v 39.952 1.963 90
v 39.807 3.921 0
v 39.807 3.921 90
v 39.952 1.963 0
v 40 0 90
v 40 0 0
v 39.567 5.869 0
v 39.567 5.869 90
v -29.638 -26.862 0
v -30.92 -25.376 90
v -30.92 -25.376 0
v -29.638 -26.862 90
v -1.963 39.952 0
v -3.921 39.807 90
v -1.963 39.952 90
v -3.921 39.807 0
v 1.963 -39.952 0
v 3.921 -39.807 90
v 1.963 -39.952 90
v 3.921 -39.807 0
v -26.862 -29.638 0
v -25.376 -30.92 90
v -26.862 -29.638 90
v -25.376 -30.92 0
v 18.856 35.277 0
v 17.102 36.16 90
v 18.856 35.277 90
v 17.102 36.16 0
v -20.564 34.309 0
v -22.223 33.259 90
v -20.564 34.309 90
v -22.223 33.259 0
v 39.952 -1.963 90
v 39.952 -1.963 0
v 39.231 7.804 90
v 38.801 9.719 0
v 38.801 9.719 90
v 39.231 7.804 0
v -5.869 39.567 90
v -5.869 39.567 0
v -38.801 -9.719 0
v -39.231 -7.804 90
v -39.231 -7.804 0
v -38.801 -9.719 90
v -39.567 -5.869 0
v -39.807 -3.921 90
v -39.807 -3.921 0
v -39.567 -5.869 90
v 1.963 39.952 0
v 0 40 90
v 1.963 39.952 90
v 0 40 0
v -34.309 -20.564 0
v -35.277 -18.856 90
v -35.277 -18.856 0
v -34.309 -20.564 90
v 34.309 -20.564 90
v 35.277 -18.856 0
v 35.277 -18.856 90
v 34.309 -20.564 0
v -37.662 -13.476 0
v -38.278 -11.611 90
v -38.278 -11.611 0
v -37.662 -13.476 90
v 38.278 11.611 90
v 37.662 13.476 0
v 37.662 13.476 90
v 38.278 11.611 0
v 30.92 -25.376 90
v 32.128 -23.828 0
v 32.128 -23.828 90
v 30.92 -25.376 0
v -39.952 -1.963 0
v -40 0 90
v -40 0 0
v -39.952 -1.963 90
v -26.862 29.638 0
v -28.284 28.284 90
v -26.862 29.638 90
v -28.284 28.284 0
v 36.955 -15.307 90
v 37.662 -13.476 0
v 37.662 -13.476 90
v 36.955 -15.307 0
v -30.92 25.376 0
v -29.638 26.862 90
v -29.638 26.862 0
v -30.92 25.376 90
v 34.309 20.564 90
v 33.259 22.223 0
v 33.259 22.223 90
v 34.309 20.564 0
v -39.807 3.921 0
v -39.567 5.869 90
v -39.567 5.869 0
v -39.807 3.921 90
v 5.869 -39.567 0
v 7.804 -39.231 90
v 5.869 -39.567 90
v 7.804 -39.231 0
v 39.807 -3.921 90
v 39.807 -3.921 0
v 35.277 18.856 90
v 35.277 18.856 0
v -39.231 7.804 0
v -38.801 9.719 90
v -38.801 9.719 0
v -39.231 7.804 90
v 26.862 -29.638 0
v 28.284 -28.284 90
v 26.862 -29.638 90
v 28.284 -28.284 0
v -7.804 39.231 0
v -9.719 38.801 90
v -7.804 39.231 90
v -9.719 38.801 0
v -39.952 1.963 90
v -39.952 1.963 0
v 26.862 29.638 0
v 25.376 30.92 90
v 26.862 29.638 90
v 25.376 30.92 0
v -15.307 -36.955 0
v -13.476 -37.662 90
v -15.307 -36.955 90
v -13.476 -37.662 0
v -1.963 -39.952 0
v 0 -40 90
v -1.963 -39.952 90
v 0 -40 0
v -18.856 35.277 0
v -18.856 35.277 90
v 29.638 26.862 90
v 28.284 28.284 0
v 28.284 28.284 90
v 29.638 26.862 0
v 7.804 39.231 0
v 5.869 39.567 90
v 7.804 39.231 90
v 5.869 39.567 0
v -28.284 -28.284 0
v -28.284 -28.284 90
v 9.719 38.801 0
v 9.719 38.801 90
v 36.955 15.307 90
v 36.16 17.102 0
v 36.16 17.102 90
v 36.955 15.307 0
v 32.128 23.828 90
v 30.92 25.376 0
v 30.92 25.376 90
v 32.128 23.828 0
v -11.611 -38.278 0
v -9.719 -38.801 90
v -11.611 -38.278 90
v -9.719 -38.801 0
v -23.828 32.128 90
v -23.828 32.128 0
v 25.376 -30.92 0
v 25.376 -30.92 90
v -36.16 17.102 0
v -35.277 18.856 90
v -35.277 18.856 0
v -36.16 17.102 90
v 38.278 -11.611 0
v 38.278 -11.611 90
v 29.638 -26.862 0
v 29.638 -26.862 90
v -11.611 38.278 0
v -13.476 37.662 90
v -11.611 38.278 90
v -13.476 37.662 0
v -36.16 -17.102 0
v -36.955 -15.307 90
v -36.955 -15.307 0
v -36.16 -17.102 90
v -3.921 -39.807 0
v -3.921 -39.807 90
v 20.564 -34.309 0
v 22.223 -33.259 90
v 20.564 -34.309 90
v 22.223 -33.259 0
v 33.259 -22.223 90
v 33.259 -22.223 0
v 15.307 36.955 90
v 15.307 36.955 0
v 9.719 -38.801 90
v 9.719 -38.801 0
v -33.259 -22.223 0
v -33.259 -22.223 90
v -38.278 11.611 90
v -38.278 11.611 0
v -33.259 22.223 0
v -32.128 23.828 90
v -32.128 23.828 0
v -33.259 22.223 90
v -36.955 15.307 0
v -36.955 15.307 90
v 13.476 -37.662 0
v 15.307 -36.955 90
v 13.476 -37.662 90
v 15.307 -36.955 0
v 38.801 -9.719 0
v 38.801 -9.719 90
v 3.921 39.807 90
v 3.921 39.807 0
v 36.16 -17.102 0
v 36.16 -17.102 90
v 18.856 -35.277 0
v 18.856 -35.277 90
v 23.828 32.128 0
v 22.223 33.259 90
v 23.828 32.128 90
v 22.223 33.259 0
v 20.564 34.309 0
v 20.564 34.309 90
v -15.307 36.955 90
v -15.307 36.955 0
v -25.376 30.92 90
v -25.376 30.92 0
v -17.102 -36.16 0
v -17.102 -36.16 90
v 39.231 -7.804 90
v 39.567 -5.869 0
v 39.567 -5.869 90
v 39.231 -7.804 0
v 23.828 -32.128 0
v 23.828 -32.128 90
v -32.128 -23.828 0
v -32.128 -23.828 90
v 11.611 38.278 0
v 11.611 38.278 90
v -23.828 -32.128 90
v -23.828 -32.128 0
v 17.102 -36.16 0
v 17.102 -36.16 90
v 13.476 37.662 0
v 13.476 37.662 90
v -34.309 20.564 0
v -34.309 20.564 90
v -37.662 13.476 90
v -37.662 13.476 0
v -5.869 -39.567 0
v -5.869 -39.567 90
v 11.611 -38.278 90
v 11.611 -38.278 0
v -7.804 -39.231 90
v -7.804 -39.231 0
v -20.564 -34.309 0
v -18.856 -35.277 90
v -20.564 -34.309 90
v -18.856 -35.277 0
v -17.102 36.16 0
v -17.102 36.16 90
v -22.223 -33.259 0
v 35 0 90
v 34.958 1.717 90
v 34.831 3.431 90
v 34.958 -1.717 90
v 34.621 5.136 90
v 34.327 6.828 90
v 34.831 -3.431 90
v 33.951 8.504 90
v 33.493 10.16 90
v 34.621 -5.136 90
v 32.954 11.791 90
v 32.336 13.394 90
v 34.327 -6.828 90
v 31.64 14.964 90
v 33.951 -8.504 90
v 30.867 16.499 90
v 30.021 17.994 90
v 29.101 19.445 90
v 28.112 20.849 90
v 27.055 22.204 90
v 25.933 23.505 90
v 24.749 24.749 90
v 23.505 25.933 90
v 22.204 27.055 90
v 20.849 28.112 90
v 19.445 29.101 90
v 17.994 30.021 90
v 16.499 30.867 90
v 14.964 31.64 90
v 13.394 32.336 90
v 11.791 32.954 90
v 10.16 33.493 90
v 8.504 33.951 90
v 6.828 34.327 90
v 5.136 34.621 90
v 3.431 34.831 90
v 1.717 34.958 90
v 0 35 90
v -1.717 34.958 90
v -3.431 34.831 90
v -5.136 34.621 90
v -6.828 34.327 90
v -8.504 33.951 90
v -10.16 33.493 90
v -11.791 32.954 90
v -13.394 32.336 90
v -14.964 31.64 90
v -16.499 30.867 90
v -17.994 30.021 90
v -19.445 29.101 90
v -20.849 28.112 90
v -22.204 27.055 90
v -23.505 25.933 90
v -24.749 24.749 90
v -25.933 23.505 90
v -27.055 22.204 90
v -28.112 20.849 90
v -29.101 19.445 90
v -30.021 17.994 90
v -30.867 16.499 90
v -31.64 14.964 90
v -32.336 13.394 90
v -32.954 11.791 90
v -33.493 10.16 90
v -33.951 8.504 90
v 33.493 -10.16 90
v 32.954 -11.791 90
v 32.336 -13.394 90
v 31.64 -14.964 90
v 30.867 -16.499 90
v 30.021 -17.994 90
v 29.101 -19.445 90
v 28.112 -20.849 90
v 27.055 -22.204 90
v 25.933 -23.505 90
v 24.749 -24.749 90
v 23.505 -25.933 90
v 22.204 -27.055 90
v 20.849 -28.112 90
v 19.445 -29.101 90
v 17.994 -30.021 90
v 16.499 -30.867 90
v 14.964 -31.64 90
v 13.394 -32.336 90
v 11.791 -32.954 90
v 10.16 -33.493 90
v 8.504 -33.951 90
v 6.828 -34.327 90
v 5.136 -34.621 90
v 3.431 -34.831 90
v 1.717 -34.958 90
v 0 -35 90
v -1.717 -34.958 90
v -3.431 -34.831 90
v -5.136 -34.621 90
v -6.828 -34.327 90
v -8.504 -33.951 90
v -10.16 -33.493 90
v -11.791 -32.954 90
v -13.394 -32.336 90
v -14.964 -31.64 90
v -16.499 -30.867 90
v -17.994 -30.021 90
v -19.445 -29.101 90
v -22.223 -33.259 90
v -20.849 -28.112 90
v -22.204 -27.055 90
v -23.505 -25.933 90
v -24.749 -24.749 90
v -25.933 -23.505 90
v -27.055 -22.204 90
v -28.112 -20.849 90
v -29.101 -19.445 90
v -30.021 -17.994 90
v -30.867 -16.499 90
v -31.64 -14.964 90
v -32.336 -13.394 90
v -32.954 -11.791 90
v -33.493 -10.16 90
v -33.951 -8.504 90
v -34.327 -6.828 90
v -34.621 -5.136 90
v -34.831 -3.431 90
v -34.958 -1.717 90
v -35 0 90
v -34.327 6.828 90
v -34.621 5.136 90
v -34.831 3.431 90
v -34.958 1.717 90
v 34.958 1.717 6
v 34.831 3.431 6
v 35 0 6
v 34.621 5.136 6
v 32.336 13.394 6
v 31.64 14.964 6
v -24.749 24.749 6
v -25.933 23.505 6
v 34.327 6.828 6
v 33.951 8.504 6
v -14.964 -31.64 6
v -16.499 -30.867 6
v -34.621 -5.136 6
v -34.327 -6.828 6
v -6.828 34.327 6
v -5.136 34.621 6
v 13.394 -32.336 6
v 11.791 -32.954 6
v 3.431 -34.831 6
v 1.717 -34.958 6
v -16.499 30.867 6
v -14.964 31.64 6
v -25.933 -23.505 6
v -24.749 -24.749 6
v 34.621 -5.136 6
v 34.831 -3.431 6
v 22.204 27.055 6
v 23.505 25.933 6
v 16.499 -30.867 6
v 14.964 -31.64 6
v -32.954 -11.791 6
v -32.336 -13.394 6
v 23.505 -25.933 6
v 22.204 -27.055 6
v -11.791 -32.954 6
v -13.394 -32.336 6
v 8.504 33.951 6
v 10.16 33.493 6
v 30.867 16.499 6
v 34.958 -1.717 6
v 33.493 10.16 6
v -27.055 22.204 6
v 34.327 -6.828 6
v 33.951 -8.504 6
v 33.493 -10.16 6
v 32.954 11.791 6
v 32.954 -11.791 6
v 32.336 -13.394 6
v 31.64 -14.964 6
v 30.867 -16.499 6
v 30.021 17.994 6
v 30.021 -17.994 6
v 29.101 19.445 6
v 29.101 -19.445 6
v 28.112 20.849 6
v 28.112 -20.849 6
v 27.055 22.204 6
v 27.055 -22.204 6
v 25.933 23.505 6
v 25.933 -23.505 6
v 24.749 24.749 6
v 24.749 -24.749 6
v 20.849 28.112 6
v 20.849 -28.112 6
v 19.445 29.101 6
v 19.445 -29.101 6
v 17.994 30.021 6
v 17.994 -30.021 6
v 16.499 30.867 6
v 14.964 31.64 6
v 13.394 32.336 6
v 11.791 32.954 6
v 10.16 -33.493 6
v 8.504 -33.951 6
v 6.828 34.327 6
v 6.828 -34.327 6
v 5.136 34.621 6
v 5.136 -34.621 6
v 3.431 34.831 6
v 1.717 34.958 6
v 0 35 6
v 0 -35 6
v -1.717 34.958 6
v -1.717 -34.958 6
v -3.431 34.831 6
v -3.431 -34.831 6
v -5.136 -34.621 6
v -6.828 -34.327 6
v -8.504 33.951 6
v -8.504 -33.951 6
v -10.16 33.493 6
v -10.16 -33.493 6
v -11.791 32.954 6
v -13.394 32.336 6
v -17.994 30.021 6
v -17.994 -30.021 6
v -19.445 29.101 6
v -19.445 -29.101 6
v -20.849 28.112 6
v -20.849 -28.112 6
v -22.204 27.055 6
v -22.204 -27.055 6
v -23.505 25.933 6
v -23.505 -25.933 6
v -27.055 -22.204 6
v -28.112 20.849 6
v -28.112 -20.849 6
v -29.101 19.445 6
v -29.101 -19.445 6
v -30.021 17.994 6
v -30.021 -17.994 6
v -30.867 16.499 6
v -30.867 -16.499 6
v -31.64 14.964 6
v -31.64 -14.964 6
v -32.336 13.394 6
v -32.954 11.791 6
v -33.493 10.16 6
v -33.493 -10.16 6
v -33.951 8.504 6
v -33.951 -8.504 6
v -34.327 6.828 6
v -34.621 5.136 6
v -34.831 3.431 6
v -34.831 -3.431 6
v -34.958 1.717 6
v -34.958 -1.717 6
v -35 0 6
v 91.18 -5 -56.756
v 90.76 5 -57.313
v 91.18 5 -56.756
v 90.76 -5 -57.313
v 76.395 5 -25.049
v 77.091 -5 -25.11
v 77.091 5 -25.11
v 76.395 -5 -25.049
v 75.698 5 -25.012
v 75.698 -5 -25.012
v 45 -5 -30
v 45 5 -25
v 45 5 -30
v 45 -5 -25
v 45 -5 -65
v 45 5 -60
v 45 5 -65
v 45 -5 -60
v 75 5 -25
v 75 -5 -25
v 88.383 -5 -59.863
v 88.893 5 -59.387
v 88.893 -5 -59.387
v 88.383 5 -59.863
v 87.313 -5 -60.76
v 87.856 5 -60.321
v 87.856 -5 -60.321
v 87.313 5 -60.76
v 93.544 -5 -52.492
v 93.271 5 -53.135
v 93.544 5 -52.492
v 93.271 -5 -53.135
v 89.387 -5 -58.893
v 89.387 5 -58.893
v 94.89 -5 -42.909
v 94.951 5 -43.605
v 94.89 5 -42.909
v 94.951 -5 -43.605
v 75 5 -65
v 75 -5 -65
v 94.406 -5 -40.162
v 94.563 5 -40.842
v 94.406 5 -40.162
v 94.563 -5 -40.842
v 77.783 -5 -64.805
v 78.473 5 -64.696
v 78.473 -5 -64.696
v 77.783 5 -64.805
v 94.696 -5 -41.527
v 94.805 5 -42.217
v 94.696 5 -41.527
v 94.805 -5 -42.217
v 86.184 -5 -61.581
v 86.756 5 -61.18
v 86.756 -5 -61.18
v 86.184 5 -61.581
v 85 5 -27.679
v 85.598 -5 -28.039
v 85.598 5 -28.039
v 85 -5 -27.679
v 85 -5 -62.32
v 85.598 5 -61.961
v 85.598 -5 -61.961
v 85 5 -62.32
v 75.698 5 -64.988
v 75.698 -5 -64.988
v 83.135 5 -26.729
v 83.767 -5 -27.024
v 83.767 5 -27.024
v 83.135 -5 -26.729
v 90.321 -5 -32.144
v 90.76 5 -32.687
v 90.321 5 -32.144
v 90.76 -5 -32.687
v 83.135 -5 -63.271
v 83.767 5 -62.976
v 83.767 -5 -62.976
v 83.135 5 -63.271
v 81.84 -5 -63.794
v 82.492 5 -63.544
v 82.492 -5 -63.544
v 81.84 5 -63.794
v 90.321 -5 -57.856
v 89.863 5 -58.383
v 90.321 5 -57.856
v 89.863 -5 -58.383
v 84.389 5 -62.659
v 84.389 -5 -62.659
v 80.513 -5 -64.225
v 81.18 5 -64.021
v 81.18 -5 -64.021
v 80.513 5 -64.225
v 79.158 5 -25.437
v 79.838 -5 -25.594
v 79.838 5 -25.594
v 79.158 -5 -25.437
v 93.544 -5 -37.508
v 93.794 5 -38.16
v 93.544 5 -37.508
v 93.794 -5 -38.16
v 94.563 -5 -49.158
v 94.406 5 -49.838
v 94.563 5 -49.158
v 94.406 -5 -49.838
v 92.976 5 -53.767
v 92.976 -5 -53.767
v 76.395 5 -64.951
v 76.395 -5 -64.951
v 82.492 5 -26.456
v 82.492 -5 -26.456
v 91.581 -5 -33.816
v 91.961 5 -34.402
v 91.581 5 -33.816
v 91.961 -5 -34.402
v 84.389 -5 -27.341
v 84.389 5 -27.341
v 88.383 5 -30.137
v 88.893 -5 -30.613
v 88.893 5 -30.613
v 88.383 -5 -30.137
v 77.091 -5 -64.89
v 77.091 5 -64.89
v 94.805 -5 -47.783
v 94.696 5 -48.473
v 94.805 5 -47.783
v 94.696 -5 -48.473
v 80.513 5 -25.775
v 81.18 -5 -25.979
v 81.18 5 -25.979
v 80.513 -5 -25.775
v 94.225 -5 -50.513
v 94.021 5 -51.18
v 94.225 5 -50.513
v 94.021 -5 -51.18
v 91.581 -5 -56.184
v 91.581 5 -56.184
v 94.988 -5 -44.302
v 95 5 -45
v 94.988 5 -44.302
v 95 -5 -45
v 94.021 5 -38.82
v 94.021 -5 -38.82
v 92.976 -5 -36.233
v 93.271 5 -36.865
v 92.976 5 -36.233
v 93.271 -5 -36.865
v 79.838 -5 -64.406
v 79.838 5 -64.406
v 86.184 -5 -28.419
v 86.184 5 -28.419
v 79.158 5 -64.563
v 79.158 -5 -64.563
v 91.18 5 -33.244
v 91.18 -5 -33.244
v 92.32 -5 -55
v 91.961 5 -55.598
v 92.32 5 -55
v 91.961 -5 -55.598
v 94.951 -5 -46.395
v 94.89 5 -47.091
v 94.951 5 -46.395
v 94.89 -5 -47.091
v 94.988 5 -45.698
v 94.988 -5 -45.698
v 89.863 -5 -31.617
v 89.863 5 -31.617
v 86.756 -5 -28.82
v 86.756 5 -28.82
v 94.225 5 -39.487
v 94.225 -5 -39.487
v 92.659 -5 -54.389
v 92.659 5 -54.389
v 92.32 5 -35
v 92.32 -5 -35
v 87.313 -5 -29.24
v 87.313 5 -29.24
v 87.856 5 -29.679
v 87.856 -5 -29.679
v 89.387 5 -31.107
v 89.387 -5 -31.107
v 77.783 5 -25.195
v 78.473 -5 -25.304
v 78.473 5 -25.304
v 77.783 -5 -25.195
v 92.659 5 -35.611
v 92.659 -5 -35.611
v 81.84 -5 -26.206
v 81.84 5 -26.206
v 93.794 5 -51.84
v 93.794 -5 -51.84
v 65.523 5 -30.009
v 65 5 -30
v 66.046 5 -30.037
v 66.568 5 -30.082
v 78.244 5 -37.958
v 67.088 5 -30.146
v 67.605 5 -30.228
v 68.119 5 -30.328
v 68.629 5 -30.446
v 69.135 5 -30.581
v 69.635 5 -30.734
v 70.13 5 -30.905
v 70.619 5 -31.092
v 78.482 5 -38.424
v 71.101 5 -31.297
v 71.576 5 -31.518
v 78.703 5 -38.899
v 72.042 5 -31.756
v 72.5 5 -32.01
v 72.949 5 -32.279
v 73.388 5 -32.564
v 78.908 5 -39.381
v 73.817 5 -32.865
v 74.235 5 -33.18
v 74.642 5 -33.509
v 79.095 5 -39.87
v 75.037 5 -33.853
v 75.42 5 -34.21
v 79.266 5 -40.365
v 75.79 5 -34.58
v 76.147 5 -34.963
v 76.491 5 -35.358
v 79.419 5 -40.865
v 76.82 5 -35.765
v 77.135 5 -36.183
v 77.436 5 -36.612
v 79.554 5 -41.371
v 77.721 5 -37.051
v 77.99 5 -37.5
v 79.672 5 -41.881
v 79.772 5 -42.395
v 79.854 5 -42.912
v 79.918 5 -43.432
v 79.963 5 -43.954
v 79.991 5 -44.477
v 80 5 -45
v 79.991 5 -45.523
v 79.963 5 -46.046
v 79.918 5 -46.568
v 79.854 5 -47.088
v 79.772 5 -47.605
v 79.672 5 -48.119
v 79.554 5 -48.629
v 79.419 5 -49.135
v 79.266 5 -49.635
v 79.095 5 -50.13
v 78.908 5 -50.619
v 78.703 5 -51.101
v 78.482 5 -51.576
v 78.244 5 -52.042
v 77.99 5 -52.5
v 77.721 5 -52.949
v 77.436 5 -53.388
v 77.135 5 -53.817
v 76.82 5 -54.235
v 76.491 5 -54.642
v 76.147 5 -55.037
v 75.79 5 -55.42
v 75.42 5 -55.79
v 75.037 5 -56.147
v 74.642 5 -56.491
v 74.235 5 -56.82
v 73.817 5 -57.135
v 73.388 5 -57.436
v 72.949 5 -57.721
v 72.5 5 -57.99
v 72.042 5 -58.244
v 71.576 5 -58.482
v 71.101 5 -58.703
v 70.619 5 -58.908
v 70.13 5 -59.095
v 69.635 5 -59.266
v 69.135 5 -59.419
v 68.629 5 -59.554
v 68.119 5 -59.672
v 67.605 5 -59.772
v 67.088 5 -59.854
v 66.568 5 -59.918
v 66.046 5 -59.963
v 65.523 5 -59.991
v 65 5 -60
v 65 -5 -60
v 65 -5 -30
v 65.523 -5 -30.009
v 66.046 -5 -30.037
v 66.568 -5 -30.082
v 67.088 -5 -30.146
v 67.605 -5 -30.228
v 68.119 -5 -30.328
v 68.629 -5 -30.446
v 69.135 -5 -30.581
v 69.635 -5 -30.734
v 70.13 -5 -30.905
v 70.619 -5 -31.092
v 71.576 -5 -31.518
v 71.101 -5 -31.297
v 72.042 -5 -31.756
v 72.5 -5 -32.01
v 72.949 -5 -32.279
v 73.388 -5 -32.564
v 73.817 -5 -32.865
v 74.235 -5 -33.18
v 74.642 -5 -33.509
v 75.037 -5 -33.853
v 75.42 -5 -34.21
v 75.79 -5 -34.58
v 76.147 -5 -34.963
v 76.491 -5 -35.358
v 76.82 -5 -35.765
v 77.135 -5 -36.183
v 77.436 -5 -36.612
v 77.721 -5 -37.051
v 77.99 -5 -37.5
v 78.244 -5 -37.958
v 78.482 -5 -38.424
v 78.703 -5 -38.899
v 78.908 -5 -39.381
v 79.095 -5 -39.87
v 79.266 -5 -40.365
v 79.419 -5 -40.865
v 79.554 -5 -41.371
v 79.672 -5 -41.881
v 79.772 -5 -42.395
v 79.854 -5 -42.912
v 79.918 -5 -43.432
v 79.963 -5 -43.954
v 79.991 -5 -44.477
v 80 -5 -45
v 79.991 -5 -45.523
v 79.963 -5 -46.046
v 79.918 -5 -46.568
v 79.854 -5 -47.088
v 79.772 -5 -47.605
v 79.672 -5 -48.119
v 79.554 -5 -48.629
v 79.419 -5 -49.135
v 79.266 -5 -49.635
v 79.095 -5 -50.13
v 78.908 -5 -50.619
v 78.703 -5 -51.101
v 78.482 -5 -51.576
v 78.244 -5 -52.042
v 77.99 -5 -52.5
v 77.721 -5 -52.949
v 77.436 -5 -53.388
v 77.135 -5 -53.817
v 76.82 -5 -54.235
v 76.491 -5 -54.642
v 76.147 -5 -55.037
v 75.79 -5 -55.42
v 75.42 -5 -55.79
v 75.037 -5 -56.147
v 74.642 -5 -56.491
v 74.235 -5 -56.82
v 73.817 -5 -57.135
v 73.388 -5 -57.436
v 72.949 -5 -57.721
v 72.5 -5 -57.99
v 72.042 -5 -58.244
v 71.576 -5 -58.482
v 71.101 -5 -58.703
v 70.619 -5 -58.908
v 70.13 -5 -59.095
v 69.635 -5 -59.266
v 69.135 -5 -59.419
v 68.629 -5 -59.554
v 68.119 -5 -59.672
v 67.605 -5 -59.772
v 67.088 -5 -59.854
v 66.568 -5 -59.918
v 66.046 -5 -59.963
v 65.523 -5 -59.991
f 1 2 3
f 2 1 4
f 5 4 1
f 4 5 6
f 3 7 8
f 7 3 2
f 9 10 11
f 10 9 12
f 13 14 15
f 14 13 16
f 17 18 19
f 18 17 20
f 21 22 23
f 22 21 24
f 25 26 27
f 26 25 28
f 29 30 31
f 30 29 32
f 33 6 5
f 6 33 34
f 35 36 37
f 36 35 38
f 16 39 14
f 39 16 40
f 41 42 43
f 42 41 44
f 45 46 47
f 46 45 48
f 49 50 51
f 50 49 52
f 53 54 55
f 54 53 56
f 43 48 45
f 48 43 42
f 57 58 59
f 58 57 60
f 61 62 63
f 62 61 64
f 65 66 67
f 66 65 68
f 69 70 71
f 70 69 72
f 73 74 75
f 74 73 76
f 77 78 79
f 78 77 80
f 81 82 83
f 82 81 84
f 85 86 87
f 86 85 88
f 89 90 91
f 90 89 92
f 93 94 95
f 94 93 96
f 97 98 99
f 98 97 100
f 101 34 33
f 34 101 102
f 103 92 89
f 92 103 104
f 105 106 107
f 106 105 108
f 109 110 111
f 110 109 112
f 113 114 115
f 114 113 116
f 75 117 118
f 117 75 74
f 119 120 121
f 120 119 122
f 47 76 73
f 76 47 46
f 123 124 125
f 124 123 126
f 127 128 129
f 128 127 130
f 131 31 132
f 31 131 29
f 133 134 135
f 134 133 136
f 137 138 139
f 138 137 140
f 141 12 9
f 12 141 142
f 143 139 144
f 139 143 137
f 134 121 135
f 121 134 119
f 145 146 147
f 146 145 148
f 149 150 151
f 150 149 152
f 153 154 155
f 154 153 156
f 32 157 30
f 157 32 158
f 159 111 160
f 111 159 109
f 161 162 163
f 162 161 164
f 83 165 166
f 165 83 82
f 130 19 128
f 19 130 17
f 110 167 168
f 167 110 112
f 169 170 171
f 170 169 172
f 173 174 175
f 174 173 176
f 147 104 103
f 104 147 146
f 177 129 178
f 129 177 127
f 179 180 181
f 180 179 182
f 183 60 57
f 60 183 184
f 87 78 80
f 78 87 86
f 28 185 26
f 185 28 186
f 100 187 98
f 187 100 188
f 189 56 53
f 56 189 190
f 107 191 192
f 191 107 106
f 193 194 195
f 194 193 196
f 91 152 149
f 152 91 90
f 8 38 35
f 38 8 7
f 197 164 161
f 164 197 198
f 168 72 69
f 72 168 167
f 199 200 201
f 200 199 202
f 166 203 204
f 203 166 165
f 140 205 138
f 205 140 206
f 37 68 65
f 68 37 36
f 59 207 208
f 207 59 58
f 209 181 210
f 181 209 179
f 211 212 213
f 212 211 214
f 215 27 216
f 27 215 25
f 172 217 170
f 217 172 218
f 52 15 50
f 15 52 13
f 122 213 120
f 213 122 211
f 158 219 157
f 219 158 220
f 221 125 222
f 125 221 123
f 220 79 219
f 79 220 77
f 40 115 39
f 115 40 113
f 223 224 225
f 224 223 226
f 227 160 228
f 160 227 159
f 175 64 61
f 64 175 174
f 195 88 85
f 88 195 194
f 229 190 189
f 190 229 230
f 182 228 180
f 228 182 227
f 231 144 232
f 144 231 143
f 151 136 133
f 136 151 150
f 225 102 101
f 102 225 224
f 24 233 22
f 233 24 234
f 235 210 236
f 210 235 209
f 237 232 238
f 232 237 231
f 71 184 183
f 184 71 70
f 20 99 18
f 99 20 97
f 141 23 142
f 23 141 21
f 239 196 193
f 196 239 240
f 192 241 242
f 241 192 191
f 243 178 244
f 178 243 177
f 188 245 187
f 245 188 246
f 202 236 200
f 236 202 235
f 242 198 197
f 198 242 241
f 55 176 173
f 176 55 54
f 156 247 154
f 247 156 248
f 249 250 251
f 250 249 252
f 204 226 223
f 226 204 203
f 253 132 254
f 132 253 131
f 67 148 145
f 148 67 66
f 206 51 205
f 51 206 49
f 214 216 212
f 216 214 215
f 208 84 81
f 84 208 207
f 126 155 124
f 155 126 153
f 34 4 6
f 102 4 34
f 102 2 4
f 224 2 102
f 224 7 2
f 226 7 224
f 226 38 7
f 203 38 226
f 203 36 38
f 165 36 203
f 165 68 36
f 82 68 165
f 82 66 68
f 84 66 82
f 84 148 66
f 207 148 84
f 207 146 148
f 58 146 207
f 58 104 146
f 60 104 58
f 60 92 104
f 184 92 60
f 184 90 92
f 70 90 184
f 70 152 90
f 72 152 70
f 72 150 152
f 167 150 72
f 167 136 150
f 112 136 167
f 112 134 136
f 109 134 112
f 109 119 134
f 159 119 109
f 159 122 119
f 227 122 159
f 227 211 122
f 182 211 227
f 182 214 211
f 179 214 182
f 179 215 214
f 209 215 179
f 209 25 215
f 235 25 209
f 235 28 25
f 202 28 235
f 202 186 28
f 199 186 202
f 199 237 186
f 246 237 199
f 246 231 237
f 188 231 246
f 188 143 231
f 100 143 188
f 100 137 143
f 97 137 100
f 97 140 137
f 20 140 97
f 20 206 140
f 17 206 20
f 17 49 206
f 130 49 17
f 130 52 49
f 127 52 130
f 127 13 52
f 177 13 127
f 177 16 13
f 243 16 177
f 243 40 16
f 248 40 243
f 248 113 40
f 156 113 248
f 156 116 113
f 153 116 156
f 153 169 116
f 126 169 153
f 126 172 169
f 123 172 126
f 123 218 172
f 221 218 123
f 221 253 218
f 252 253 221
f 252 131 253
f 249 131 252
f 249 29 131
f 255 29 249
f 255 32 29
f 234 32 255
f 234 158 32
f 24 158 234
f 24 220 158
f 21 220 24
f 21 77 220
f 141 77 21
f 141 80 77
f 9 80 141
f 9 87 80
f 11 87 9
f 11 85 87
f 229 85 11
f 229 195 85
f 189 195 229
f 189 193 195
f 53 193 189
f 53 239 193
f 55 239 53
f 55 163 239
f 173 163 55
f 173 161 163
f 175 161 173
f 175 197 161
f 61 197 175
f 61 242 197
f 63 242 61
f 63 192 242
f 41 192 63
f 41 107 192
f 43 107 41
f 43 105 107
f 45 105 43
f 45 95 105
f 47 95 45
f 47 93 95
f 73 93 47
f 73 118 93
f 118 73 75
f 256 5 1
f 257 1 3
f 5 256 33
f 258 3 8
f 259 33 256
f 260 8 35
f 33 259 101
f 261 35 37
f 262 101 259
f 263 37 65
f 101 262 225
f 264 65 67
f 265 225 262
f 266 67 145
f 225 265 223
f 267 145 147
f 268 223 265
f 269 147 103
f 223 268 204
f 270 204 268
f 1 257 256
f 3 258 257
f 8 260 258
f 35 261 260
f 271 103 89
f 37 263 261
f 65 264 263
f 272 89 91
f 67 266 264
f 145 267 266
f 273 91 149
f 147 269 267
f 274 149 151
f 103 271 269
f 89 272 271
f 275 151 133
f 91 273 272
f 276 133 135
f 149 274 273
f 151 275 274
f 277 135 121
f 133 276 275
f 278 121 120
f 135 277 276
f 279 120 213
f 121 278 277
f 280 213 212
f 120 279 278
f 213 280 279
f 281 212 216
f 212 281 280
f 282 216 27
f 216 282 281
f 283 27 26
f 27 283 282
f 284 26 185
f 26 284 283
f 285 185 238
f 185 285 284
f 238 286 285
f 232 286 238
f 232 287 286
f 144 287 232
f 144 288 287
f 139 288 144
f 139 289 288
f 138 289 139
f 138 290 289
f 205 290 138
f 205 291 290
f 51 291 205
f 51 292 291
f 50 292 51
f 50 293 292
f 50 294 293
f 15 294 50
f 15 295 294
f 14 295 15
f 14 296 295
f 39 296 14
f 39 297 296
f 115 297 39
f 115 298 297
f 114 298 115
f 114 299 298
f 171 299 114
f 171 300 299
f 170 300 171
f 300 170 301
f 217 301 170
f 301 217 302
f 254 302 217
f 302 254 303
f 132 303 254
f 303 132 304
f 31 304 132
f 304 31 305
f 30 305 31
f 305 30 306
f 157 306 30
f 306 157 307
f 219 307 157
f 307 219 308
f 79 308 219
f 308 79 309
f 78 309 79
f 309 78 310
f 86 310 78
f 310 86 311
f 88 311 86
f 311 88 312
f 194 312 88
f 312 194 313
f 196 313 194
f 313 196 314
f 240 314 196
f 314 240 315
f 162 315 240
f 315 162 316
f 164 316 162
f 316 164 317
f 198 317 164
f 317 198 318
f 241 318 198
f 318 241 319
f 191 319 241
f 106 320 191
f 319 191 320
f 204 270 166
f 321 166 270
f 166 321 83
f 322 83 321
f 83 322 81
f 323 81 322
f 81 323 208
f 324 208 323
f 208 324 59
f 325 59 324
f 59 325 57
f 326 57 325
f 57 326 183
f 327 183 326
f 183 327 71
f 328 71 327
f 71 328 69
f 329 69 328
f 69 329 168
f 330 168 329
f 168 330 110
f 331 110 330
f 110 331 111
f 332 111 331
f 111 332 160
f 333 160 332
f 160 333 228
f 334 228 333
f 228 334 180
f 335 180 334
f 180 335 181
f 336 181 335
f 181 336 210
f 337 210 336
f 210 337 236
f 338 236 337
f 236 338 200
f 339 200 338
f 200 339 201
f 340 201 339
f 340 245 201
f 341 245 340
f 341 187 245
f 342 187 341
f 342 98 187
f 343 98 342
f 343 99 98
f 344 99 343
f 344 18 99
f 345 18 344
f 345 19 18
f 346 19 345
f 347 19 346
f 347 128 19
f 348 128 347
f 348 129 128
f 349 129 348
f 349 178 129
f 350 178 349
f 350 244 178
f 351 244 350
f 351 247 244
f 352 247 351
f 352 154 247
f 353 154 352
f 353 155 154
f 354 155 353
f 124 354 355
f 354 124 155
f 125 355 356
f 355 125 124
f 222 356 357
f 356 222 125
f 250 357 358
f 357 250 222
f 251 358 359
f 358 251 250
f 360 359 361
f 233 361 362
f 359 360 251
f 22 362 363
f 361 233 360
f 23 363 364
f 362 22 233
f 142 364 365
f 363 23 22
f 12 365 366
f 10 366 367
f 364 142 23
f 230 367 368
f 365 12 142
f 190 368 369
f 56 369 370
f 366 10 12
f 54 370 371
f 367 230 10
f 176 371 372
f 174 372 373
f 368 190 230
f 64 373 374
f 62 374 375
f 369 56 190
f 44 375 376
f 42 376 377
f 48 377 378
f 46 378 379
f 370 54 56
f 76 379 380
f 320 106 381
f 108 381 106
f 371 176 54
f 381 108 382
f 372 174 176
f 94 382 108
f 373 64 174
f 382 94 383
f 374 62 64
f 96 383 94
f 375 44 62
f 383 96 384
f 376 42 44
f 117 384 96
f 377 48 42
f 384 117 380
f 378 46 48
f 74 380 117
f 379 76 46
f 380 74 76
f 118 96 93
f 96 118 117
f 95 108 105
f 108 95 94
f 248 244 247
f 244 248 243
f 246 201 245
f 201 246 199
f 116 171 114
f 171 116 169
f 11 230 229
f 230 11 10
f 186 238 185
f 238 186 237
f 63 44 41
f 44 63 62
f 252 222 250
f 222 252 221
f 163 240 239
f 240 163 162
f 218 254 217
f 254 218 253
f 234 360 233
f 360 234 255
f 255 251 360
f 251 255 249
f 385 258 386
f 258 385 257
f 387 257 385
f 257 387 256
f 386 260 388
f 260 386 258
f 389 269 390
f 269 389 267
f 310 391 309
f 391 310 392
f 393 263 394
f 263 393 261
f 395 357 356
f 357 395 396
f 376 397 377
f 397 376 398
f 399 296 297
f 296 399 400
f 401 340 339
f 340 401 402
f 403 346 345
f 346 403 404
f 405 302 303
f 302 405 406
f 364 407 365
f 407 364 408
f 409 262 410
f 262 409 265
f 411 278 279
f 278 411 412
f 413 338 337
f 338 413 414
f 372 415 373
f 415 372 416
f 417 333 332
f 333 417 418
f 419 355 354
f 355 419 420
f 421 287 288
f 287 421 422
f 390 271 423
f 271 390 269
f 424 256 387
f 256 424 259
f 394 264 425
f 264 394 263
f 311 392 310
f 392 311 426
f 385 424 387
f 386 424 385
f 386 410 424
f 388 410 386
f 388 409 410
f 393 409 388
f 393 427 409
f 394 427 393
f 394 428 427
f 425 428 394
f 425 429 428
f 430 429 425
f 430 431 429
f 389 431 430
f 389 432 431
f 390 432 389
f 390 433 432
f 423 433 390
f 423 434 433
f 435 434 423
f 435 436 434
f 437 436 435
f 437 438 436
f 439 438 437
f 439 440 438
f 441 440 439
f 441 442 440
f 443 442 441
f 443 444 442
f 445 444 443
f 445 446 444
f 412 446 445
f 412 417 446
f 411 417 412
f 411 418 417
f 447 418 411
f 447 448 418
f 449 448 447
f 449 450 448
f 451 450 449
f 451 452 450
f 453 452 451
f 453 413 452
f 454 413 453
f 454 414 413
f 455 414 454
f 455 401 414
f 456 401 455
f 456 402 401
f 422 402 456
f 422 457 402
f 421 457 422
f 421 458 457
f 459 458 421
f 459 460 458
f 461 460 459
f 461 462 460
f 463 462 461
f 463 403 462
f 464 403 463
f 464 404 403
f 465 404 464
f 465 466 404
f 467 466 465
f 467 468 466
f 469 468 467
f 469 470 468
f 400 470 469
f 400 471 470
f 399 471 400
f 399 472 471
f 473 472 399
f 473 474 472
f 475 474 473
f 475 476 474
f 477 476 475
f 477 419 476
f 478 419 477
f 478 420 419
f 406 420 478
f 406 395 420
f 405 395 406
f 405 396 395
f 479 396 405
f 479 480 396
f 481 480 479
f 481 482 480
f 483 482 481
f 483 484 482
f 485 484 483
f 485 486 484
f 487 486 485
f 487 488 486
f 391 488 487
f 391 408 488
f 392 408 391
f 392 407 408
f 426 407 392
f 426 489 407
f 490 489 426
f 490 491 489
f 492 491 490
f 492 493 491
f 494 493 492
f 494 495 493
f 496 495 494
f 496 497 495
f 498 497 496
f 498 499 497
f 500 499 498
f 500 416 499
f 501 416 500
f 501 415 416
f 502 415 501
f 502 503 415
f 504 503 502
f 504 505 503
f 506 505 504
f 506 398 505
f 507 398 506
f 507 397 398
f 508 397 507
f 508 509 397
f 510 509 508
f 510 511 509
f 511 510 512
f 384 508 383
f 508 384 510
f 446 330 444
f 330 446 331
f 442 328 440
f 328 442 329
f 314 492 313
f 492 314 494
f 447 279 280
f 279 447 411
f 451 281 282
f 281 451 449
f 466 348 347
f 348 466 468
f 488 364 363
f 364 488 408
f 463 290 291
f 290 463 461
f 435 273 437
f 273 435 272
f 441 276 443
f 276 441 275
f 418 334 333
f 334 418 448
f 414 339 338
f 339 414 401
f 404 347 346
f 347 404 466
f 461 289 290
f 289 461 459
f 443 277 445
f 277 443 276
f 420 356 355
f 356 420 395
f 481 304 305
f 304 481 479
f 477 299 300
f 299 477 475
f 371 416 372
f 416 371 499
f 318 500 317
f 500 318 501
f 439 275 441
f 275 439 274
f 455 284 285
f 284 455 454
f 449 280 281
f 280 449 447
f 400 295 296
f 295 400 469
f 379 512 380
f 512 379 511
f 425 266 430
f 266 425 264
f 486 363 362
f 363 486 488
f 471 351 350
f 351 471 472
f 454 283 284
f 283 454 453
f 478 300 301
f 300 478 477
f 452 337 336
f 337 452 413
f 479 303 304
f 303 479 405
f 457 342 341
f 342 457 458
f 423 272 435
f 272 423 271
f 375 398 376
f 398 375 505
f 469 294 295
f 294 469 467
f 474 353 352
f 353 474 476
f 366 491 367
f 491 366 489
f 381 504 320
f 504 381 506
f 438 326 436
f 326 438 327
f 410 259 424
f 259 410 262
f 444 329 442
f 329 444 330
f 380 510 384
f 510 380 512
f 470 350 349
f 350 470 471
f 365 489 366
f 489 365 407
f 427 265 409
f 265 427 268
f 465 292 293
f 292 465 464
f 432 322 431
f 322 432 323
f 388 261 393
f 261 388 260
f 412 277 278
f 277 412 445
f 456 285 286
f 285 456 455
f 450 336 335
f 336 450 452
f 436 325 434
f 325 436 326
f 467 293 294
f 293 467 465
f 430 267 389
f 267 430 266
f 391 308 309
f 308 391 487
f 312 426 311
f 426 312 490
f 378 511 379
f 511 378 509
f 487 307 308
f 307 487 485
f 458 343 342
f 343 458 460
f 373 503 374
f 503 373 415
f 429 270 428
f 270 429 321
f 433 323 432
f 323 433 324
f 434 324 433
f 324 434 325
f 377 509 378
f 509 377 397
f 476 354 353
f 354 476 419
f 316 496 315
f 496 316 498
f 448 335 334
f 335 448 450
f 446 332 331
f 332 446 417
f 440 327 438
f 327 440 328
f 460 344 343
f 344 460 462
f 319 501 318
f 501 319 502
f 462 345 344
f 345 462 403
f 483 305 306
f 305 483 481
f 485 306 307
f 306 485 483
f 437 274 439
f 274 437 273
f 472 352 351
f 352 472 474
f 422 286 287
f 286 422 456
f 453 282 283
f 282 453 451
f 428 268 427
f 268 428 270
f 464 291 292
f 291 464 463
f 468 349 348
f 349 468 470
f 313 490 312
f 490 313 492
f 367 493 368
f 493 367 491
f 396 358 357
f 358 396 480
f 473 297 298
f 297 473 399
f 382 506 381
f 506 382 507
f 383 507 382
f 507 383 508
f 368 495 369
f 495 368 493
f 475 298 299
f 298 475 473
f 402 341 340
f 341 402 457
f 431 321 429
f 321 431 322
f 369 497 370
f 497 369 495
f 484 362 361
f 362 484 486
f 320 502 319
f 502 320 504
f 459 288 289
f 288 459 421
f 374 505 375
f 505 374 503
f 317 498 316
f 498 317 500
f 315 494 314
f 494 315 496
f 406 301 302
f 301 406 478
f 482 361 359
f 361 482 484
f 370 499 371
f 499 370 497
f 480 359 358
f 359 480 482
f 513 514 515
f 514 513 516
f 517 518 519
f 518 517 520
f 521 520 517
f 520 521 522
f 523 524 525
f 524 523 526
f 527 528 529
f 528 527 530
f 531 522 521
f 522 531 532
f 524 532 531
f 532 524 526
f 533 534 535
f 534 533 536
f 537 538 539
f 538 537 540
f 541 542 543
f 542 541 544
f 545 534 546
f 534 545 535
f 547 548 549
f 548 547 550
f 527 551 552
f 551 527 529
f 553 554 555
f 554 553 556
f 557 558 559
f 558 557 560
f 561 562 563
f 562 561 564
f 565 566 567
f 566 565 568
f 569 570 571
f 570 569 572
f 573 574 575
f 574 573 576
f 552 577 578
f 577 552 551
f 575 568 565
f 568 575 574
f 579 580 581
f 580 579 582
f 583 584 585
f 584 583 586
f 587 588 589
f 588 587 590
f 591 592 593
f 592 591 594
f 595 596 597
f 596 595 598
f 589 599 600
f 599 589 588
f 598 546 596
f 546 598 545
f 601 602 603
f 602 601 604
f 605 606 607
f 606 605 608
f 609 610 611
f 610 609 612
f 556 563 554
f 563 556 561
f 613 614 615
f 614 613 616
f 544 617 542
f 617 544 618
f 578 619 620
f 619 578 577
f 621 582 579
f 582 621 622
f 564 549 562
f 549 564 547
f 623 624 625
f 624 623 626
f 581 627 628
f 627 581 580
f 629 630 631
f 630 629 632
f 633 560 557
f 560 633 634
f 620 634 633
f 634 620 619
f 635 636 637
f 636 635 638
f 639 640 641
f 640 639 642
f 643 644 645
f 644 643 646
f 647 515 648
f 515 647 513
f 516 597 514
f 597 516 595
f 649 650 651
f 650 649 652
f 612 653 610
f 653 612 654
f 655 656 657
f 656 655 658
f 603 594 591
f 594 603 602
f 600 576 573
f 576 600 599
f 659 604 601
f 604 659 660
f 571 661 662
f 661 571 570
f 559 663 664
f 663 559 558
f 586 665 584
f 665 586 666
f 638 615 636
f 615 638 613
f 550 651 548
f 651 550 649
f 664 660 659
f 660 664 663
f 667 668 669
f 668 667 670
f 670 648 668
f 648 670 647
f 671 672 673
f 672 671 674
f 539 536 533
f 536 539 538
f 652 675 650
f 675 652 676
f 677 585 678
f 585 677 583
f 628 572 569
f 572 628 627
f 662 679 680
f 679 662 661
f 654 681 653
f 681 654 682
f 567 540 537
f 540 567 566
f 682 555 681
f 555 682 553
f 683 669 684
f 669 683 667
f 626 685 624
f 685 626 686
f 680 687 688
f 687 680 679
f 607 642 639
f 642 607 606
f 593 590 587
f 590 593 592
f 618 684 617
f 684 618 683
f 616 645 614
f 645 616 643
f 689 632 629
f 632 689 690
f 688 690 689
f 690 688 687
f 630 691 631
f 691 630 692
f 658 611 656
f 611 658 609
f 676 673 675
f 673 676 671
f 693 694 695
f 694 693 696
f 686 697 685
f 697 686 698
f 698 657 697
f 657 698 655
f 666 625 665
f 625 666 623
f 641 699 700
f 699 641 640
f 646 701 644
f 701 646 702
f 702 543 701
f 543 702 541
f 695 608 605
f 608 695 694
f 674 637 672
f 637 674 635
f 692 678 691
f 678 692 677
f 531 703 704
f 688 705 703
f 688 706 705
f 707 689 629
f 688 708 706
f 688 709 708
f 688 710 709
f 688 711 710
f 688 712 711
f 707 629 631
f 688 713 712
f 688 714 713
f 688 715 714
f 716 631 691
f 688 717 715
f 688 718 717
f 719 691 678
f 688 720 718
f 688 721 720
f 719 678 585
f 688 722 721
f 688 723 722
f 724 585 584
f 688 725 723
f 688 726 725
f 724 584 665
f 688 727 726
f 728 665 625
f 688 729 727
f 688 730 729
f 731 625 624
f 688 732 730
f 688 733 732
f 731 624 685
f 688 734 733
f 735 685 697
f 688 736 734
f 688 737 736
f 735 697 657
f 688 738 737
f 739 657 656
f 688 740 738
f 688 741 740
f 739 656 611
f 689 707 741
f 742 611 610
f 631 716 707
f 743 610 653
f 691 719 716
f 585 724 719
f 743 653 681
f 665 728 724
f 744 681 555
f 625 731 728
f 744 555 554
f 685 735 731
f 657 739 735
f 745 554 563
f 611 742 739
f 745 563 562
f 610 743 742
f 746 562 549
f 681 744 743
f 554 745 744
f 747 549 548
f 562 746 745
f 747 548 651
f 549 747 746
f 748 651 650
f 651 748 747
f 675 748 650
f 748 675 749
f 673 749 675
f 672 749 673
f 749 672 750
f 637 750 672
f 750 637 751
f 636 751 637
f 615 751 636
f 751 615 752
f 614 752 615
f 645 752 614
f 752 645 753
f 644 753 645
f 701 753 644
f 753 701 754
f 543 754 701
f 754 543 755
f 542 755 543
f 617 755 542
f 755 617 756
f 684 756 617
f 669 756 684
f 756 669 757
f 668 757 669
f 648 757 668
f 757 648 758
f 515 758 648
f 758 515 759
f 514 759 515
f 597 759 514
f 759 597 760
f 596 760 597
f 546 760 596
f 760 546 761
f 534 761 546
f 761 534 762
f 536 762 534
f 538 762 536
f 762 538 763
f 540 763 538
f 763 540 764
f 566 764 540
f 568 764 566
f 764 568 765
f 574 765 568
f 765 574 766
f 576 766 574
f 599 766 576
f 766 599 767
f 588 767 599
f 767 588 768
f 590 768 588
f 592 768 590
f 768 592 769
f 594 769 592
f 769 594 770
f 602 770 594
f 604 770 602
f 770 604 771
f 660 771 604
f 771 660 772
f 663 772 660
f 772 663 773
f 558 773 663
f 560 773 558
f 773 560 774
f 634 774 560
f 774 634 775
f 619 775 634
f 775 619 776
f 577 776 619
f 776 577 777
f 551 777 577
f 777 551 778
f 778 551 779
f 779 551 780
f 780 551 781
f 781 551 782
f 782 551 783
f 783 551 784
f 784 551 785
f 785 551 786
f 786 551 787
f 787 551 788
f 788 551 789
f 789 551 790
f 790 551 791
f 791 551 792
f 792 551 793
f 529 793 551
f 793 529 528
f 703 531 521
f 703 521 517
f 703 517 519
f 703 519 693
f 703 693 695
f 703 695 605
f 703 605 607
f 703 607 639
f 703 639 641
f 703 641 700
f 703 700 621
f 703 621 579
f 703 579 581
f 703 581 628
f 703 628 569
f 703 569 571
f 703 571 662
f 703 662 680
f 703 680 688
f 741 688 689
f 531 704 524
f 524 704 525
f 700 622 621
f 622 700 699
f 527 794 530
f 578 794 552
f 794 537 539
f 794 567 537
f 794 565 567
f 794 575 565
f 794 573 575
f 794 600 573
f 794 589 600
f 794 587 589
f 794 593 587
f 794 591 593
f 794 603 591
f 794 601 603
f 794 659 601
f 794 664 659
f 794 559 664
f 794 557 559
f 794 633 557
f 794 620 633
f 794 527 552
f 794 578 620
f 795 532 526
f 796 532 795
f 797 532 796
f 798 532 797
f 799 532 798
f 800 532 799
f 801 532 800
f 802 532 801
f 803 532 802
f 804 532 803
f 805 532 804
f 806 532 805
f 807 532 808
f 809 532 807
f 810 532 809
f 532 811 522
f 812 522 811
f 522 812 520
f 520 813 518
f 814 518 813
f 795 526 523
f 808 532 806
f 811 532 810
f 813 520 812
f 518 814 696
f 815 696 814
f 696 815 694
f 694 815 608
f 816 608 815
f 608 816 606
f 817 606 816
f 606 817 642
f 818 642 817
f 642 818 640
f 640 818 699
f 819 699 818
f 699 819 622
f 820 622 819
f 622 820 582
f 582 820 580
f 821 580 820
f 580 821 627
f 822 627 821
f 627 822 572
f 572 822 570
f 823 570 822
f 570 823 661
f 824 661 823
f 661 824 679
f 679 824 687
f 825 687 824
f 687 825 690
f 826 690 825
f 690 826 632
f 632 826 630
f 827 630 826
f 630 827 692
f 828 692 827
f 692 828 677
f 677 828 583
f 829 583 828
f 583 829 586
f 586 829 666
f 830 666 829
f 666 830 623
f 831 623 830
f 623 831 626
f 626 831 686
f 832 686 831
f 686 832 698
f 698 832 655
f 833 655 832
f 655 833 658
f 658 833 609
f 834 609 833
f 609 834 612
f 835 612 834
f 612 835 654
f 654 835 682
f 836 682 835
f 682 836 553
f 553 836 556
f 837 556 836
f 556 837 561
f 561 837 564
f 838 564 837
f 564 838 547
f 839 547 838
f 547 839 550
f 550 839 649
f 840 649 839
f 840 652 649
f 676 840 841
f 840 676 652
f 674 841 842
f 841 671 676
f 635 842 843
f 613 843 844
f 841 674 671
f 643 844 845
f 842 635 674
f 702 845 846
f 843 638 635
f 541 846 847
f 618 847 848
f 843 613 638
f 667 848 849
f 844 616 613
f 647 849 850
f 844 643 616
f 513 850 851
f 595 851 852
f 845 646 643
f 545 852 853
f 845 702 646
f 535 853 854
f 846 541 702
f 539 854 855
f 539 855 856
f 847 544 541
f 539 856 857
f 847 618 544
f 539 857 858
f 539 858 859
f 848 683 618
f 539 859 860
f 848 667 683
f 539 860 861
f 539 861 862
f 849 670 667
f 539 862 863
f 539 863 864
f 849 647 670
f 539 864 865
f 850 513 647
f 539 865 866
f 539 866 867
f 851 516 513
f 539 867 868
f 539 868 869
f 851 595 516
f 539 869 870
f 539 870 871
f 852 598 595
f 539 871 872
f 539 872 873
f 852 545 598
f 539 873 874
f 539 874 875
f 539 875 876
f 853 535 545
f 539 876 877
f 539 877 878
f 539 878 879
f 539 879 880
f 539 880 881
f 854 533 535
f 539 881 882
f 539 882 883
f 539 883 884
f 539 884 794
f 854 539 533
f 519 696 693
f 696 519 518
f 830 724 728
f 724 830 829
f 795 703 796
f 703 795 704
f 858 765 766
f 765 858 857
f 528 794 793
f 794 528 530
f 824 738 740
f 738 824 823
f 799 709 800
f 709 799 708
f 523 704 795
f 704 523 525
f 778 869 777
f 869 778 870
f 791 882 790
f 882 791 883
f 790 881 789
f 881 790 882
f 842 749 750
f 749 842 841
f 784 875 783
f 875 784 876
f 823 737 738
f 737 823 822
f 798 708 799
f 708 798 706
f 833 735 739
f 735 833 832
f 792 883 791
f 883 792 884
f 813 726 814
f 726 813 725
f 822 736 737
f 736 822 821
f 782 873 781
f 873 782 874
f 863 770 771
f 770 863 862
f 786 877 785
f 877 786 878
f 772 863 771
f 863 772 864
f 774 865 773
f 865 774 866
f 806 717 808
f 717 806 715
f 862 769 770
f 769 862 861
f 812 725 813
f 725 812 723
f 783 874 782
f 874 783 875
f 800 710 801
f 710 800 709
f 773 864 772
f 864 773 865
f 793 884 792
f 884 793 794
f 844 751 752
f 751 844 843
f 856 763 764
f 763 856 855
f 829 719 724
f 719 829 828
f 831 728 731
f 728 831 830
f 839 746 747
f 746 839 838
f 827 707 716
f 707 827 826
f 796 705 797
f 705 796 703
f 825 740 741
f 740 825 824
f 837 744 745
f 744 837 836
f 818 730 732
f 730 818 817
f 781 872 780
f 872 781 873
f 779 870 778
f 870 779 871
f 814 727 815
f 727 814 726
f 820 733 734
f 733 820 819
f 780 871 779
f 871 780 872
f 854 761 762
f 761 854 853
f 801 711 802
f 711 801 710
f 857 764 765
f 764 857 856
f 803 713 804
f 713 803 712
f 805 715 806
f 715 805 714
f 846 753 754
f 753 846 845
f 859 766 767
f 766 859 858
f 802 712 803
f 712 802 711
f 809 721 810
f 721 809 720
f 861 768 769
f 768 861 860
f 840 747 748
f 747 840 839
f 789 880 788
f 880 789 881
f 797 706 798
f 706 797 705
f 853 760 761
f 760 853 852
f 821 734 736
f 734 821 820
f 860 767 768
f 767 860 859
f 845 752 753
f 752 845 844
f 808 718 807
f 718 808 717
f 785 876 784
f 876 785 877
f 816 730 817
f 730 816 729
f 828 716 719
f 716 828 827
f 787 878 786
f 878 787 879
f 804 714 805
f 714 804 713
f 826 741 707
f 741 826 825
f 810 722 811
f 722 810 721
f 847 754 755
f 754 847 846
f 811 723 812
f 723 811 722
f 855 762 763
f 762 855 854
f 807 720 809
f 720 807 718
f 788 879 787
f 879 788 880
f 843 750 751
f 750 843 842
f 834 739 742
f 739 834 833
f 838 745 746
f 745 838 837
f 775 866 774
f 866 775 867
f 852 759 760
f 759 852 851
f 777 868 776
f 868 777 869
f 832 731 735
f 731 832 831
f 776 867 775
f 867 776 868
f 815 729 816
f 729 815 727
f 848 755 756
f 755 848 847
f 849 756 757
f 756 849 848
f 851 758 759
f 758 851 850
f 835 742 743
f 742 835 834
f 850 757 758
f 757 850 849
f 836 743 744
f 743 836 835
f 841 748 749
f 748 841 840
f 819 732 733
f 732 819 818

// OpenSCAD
$fn = 128;

// Mug dimensions
outer_d = 80;
inner_d = 70;
mug_h   = 90;
bottom_t = 6;

// Handle target opening (inner void)
handle_void_h = 30;
handle_void_w = 25;

// Handle placement
z_center = mug_h / 2;
z0 = z_center - handle_void_h / 2;

// Derived
r_outer = outer_d / 2;
r_inner = inner_d / 2;

// Build
union() {
    // Mug body (hollow with bottom thickness)
    difference() {
        cylinder(h = mug_h, d = outer_d);
        translate([0, 0, bottom_t])
            cylinder(h = mug_h - bottom_t + 0.01, d = inner_d);
    }

    // Handle on +X side only: D-shape in XZ profile, extruded along Y
    // Inner opening: 25 (X) x 30 (Z)
    // Ring thickness around opening:
    t_radial = 5;   // along X/Z profile
    t_depth  = 10;  // along Y (grip thickness)

    // Place so inner flat side lies on mug outer tangent plane at x = r_outer
    x_inner_flat = r_outer;
    x_outer_flat = x_inner_flat + t_radial;

    // Inner profile center (for semicircle cap)
    xi_c = x_inner_flat + handle_void_w;       // center x of inner semicircle
    zi_c = z_center;

    // Outer profile center
    xo_c = x_outer_flat + handle_void_w + t_radial;
    zo_c = z_center;

    // Depth placement: centered at y=0
    y0 = - (handle_void_h + 0) / 2; // not used directly; keep symmetry intent

    // Construct as outer D minus inner D, then union with mug
    translate([0, 0, 0])
    difference() {
        // Outer D, extruded in Y
        translate([0, -t_depth/2, 0])
        rotate([-90, 0, 0])
        linear_extrude(height = t_depth)
        polygon(points = concat(
            [[x_outer_flat, z0 - t_radial], [x_outer_flat, z0 + handle_void_h + t_radial]],
            [ for (a = [90 : -2 : -90]) [ xo_c + (handle_void_h/2 + t_radial) * cos(a), zo_c + (handle_void_h/2 + t_radial) * sin(a) ] ]
        ));

        // Inner D void, extruded slightly larger in Y to ensure clean subtraction
        translate([0, -(t_depth/2 + 0.1), 0])
        rotate([-90, 0, 0])
        linear_extrude(height = t_depth + 0.2)
        polygon(points = concat(
            [[x_inner_flat, z0], [x_inner_flat, z0 + handle_void_h]],
            [ for (a = [90 : -2 : -90]) [ xi_c + (handle_void_h/2) * cos(a), zi_c + (handle_void_h/2) * sin(a) ] ]
        ));
    }
}
